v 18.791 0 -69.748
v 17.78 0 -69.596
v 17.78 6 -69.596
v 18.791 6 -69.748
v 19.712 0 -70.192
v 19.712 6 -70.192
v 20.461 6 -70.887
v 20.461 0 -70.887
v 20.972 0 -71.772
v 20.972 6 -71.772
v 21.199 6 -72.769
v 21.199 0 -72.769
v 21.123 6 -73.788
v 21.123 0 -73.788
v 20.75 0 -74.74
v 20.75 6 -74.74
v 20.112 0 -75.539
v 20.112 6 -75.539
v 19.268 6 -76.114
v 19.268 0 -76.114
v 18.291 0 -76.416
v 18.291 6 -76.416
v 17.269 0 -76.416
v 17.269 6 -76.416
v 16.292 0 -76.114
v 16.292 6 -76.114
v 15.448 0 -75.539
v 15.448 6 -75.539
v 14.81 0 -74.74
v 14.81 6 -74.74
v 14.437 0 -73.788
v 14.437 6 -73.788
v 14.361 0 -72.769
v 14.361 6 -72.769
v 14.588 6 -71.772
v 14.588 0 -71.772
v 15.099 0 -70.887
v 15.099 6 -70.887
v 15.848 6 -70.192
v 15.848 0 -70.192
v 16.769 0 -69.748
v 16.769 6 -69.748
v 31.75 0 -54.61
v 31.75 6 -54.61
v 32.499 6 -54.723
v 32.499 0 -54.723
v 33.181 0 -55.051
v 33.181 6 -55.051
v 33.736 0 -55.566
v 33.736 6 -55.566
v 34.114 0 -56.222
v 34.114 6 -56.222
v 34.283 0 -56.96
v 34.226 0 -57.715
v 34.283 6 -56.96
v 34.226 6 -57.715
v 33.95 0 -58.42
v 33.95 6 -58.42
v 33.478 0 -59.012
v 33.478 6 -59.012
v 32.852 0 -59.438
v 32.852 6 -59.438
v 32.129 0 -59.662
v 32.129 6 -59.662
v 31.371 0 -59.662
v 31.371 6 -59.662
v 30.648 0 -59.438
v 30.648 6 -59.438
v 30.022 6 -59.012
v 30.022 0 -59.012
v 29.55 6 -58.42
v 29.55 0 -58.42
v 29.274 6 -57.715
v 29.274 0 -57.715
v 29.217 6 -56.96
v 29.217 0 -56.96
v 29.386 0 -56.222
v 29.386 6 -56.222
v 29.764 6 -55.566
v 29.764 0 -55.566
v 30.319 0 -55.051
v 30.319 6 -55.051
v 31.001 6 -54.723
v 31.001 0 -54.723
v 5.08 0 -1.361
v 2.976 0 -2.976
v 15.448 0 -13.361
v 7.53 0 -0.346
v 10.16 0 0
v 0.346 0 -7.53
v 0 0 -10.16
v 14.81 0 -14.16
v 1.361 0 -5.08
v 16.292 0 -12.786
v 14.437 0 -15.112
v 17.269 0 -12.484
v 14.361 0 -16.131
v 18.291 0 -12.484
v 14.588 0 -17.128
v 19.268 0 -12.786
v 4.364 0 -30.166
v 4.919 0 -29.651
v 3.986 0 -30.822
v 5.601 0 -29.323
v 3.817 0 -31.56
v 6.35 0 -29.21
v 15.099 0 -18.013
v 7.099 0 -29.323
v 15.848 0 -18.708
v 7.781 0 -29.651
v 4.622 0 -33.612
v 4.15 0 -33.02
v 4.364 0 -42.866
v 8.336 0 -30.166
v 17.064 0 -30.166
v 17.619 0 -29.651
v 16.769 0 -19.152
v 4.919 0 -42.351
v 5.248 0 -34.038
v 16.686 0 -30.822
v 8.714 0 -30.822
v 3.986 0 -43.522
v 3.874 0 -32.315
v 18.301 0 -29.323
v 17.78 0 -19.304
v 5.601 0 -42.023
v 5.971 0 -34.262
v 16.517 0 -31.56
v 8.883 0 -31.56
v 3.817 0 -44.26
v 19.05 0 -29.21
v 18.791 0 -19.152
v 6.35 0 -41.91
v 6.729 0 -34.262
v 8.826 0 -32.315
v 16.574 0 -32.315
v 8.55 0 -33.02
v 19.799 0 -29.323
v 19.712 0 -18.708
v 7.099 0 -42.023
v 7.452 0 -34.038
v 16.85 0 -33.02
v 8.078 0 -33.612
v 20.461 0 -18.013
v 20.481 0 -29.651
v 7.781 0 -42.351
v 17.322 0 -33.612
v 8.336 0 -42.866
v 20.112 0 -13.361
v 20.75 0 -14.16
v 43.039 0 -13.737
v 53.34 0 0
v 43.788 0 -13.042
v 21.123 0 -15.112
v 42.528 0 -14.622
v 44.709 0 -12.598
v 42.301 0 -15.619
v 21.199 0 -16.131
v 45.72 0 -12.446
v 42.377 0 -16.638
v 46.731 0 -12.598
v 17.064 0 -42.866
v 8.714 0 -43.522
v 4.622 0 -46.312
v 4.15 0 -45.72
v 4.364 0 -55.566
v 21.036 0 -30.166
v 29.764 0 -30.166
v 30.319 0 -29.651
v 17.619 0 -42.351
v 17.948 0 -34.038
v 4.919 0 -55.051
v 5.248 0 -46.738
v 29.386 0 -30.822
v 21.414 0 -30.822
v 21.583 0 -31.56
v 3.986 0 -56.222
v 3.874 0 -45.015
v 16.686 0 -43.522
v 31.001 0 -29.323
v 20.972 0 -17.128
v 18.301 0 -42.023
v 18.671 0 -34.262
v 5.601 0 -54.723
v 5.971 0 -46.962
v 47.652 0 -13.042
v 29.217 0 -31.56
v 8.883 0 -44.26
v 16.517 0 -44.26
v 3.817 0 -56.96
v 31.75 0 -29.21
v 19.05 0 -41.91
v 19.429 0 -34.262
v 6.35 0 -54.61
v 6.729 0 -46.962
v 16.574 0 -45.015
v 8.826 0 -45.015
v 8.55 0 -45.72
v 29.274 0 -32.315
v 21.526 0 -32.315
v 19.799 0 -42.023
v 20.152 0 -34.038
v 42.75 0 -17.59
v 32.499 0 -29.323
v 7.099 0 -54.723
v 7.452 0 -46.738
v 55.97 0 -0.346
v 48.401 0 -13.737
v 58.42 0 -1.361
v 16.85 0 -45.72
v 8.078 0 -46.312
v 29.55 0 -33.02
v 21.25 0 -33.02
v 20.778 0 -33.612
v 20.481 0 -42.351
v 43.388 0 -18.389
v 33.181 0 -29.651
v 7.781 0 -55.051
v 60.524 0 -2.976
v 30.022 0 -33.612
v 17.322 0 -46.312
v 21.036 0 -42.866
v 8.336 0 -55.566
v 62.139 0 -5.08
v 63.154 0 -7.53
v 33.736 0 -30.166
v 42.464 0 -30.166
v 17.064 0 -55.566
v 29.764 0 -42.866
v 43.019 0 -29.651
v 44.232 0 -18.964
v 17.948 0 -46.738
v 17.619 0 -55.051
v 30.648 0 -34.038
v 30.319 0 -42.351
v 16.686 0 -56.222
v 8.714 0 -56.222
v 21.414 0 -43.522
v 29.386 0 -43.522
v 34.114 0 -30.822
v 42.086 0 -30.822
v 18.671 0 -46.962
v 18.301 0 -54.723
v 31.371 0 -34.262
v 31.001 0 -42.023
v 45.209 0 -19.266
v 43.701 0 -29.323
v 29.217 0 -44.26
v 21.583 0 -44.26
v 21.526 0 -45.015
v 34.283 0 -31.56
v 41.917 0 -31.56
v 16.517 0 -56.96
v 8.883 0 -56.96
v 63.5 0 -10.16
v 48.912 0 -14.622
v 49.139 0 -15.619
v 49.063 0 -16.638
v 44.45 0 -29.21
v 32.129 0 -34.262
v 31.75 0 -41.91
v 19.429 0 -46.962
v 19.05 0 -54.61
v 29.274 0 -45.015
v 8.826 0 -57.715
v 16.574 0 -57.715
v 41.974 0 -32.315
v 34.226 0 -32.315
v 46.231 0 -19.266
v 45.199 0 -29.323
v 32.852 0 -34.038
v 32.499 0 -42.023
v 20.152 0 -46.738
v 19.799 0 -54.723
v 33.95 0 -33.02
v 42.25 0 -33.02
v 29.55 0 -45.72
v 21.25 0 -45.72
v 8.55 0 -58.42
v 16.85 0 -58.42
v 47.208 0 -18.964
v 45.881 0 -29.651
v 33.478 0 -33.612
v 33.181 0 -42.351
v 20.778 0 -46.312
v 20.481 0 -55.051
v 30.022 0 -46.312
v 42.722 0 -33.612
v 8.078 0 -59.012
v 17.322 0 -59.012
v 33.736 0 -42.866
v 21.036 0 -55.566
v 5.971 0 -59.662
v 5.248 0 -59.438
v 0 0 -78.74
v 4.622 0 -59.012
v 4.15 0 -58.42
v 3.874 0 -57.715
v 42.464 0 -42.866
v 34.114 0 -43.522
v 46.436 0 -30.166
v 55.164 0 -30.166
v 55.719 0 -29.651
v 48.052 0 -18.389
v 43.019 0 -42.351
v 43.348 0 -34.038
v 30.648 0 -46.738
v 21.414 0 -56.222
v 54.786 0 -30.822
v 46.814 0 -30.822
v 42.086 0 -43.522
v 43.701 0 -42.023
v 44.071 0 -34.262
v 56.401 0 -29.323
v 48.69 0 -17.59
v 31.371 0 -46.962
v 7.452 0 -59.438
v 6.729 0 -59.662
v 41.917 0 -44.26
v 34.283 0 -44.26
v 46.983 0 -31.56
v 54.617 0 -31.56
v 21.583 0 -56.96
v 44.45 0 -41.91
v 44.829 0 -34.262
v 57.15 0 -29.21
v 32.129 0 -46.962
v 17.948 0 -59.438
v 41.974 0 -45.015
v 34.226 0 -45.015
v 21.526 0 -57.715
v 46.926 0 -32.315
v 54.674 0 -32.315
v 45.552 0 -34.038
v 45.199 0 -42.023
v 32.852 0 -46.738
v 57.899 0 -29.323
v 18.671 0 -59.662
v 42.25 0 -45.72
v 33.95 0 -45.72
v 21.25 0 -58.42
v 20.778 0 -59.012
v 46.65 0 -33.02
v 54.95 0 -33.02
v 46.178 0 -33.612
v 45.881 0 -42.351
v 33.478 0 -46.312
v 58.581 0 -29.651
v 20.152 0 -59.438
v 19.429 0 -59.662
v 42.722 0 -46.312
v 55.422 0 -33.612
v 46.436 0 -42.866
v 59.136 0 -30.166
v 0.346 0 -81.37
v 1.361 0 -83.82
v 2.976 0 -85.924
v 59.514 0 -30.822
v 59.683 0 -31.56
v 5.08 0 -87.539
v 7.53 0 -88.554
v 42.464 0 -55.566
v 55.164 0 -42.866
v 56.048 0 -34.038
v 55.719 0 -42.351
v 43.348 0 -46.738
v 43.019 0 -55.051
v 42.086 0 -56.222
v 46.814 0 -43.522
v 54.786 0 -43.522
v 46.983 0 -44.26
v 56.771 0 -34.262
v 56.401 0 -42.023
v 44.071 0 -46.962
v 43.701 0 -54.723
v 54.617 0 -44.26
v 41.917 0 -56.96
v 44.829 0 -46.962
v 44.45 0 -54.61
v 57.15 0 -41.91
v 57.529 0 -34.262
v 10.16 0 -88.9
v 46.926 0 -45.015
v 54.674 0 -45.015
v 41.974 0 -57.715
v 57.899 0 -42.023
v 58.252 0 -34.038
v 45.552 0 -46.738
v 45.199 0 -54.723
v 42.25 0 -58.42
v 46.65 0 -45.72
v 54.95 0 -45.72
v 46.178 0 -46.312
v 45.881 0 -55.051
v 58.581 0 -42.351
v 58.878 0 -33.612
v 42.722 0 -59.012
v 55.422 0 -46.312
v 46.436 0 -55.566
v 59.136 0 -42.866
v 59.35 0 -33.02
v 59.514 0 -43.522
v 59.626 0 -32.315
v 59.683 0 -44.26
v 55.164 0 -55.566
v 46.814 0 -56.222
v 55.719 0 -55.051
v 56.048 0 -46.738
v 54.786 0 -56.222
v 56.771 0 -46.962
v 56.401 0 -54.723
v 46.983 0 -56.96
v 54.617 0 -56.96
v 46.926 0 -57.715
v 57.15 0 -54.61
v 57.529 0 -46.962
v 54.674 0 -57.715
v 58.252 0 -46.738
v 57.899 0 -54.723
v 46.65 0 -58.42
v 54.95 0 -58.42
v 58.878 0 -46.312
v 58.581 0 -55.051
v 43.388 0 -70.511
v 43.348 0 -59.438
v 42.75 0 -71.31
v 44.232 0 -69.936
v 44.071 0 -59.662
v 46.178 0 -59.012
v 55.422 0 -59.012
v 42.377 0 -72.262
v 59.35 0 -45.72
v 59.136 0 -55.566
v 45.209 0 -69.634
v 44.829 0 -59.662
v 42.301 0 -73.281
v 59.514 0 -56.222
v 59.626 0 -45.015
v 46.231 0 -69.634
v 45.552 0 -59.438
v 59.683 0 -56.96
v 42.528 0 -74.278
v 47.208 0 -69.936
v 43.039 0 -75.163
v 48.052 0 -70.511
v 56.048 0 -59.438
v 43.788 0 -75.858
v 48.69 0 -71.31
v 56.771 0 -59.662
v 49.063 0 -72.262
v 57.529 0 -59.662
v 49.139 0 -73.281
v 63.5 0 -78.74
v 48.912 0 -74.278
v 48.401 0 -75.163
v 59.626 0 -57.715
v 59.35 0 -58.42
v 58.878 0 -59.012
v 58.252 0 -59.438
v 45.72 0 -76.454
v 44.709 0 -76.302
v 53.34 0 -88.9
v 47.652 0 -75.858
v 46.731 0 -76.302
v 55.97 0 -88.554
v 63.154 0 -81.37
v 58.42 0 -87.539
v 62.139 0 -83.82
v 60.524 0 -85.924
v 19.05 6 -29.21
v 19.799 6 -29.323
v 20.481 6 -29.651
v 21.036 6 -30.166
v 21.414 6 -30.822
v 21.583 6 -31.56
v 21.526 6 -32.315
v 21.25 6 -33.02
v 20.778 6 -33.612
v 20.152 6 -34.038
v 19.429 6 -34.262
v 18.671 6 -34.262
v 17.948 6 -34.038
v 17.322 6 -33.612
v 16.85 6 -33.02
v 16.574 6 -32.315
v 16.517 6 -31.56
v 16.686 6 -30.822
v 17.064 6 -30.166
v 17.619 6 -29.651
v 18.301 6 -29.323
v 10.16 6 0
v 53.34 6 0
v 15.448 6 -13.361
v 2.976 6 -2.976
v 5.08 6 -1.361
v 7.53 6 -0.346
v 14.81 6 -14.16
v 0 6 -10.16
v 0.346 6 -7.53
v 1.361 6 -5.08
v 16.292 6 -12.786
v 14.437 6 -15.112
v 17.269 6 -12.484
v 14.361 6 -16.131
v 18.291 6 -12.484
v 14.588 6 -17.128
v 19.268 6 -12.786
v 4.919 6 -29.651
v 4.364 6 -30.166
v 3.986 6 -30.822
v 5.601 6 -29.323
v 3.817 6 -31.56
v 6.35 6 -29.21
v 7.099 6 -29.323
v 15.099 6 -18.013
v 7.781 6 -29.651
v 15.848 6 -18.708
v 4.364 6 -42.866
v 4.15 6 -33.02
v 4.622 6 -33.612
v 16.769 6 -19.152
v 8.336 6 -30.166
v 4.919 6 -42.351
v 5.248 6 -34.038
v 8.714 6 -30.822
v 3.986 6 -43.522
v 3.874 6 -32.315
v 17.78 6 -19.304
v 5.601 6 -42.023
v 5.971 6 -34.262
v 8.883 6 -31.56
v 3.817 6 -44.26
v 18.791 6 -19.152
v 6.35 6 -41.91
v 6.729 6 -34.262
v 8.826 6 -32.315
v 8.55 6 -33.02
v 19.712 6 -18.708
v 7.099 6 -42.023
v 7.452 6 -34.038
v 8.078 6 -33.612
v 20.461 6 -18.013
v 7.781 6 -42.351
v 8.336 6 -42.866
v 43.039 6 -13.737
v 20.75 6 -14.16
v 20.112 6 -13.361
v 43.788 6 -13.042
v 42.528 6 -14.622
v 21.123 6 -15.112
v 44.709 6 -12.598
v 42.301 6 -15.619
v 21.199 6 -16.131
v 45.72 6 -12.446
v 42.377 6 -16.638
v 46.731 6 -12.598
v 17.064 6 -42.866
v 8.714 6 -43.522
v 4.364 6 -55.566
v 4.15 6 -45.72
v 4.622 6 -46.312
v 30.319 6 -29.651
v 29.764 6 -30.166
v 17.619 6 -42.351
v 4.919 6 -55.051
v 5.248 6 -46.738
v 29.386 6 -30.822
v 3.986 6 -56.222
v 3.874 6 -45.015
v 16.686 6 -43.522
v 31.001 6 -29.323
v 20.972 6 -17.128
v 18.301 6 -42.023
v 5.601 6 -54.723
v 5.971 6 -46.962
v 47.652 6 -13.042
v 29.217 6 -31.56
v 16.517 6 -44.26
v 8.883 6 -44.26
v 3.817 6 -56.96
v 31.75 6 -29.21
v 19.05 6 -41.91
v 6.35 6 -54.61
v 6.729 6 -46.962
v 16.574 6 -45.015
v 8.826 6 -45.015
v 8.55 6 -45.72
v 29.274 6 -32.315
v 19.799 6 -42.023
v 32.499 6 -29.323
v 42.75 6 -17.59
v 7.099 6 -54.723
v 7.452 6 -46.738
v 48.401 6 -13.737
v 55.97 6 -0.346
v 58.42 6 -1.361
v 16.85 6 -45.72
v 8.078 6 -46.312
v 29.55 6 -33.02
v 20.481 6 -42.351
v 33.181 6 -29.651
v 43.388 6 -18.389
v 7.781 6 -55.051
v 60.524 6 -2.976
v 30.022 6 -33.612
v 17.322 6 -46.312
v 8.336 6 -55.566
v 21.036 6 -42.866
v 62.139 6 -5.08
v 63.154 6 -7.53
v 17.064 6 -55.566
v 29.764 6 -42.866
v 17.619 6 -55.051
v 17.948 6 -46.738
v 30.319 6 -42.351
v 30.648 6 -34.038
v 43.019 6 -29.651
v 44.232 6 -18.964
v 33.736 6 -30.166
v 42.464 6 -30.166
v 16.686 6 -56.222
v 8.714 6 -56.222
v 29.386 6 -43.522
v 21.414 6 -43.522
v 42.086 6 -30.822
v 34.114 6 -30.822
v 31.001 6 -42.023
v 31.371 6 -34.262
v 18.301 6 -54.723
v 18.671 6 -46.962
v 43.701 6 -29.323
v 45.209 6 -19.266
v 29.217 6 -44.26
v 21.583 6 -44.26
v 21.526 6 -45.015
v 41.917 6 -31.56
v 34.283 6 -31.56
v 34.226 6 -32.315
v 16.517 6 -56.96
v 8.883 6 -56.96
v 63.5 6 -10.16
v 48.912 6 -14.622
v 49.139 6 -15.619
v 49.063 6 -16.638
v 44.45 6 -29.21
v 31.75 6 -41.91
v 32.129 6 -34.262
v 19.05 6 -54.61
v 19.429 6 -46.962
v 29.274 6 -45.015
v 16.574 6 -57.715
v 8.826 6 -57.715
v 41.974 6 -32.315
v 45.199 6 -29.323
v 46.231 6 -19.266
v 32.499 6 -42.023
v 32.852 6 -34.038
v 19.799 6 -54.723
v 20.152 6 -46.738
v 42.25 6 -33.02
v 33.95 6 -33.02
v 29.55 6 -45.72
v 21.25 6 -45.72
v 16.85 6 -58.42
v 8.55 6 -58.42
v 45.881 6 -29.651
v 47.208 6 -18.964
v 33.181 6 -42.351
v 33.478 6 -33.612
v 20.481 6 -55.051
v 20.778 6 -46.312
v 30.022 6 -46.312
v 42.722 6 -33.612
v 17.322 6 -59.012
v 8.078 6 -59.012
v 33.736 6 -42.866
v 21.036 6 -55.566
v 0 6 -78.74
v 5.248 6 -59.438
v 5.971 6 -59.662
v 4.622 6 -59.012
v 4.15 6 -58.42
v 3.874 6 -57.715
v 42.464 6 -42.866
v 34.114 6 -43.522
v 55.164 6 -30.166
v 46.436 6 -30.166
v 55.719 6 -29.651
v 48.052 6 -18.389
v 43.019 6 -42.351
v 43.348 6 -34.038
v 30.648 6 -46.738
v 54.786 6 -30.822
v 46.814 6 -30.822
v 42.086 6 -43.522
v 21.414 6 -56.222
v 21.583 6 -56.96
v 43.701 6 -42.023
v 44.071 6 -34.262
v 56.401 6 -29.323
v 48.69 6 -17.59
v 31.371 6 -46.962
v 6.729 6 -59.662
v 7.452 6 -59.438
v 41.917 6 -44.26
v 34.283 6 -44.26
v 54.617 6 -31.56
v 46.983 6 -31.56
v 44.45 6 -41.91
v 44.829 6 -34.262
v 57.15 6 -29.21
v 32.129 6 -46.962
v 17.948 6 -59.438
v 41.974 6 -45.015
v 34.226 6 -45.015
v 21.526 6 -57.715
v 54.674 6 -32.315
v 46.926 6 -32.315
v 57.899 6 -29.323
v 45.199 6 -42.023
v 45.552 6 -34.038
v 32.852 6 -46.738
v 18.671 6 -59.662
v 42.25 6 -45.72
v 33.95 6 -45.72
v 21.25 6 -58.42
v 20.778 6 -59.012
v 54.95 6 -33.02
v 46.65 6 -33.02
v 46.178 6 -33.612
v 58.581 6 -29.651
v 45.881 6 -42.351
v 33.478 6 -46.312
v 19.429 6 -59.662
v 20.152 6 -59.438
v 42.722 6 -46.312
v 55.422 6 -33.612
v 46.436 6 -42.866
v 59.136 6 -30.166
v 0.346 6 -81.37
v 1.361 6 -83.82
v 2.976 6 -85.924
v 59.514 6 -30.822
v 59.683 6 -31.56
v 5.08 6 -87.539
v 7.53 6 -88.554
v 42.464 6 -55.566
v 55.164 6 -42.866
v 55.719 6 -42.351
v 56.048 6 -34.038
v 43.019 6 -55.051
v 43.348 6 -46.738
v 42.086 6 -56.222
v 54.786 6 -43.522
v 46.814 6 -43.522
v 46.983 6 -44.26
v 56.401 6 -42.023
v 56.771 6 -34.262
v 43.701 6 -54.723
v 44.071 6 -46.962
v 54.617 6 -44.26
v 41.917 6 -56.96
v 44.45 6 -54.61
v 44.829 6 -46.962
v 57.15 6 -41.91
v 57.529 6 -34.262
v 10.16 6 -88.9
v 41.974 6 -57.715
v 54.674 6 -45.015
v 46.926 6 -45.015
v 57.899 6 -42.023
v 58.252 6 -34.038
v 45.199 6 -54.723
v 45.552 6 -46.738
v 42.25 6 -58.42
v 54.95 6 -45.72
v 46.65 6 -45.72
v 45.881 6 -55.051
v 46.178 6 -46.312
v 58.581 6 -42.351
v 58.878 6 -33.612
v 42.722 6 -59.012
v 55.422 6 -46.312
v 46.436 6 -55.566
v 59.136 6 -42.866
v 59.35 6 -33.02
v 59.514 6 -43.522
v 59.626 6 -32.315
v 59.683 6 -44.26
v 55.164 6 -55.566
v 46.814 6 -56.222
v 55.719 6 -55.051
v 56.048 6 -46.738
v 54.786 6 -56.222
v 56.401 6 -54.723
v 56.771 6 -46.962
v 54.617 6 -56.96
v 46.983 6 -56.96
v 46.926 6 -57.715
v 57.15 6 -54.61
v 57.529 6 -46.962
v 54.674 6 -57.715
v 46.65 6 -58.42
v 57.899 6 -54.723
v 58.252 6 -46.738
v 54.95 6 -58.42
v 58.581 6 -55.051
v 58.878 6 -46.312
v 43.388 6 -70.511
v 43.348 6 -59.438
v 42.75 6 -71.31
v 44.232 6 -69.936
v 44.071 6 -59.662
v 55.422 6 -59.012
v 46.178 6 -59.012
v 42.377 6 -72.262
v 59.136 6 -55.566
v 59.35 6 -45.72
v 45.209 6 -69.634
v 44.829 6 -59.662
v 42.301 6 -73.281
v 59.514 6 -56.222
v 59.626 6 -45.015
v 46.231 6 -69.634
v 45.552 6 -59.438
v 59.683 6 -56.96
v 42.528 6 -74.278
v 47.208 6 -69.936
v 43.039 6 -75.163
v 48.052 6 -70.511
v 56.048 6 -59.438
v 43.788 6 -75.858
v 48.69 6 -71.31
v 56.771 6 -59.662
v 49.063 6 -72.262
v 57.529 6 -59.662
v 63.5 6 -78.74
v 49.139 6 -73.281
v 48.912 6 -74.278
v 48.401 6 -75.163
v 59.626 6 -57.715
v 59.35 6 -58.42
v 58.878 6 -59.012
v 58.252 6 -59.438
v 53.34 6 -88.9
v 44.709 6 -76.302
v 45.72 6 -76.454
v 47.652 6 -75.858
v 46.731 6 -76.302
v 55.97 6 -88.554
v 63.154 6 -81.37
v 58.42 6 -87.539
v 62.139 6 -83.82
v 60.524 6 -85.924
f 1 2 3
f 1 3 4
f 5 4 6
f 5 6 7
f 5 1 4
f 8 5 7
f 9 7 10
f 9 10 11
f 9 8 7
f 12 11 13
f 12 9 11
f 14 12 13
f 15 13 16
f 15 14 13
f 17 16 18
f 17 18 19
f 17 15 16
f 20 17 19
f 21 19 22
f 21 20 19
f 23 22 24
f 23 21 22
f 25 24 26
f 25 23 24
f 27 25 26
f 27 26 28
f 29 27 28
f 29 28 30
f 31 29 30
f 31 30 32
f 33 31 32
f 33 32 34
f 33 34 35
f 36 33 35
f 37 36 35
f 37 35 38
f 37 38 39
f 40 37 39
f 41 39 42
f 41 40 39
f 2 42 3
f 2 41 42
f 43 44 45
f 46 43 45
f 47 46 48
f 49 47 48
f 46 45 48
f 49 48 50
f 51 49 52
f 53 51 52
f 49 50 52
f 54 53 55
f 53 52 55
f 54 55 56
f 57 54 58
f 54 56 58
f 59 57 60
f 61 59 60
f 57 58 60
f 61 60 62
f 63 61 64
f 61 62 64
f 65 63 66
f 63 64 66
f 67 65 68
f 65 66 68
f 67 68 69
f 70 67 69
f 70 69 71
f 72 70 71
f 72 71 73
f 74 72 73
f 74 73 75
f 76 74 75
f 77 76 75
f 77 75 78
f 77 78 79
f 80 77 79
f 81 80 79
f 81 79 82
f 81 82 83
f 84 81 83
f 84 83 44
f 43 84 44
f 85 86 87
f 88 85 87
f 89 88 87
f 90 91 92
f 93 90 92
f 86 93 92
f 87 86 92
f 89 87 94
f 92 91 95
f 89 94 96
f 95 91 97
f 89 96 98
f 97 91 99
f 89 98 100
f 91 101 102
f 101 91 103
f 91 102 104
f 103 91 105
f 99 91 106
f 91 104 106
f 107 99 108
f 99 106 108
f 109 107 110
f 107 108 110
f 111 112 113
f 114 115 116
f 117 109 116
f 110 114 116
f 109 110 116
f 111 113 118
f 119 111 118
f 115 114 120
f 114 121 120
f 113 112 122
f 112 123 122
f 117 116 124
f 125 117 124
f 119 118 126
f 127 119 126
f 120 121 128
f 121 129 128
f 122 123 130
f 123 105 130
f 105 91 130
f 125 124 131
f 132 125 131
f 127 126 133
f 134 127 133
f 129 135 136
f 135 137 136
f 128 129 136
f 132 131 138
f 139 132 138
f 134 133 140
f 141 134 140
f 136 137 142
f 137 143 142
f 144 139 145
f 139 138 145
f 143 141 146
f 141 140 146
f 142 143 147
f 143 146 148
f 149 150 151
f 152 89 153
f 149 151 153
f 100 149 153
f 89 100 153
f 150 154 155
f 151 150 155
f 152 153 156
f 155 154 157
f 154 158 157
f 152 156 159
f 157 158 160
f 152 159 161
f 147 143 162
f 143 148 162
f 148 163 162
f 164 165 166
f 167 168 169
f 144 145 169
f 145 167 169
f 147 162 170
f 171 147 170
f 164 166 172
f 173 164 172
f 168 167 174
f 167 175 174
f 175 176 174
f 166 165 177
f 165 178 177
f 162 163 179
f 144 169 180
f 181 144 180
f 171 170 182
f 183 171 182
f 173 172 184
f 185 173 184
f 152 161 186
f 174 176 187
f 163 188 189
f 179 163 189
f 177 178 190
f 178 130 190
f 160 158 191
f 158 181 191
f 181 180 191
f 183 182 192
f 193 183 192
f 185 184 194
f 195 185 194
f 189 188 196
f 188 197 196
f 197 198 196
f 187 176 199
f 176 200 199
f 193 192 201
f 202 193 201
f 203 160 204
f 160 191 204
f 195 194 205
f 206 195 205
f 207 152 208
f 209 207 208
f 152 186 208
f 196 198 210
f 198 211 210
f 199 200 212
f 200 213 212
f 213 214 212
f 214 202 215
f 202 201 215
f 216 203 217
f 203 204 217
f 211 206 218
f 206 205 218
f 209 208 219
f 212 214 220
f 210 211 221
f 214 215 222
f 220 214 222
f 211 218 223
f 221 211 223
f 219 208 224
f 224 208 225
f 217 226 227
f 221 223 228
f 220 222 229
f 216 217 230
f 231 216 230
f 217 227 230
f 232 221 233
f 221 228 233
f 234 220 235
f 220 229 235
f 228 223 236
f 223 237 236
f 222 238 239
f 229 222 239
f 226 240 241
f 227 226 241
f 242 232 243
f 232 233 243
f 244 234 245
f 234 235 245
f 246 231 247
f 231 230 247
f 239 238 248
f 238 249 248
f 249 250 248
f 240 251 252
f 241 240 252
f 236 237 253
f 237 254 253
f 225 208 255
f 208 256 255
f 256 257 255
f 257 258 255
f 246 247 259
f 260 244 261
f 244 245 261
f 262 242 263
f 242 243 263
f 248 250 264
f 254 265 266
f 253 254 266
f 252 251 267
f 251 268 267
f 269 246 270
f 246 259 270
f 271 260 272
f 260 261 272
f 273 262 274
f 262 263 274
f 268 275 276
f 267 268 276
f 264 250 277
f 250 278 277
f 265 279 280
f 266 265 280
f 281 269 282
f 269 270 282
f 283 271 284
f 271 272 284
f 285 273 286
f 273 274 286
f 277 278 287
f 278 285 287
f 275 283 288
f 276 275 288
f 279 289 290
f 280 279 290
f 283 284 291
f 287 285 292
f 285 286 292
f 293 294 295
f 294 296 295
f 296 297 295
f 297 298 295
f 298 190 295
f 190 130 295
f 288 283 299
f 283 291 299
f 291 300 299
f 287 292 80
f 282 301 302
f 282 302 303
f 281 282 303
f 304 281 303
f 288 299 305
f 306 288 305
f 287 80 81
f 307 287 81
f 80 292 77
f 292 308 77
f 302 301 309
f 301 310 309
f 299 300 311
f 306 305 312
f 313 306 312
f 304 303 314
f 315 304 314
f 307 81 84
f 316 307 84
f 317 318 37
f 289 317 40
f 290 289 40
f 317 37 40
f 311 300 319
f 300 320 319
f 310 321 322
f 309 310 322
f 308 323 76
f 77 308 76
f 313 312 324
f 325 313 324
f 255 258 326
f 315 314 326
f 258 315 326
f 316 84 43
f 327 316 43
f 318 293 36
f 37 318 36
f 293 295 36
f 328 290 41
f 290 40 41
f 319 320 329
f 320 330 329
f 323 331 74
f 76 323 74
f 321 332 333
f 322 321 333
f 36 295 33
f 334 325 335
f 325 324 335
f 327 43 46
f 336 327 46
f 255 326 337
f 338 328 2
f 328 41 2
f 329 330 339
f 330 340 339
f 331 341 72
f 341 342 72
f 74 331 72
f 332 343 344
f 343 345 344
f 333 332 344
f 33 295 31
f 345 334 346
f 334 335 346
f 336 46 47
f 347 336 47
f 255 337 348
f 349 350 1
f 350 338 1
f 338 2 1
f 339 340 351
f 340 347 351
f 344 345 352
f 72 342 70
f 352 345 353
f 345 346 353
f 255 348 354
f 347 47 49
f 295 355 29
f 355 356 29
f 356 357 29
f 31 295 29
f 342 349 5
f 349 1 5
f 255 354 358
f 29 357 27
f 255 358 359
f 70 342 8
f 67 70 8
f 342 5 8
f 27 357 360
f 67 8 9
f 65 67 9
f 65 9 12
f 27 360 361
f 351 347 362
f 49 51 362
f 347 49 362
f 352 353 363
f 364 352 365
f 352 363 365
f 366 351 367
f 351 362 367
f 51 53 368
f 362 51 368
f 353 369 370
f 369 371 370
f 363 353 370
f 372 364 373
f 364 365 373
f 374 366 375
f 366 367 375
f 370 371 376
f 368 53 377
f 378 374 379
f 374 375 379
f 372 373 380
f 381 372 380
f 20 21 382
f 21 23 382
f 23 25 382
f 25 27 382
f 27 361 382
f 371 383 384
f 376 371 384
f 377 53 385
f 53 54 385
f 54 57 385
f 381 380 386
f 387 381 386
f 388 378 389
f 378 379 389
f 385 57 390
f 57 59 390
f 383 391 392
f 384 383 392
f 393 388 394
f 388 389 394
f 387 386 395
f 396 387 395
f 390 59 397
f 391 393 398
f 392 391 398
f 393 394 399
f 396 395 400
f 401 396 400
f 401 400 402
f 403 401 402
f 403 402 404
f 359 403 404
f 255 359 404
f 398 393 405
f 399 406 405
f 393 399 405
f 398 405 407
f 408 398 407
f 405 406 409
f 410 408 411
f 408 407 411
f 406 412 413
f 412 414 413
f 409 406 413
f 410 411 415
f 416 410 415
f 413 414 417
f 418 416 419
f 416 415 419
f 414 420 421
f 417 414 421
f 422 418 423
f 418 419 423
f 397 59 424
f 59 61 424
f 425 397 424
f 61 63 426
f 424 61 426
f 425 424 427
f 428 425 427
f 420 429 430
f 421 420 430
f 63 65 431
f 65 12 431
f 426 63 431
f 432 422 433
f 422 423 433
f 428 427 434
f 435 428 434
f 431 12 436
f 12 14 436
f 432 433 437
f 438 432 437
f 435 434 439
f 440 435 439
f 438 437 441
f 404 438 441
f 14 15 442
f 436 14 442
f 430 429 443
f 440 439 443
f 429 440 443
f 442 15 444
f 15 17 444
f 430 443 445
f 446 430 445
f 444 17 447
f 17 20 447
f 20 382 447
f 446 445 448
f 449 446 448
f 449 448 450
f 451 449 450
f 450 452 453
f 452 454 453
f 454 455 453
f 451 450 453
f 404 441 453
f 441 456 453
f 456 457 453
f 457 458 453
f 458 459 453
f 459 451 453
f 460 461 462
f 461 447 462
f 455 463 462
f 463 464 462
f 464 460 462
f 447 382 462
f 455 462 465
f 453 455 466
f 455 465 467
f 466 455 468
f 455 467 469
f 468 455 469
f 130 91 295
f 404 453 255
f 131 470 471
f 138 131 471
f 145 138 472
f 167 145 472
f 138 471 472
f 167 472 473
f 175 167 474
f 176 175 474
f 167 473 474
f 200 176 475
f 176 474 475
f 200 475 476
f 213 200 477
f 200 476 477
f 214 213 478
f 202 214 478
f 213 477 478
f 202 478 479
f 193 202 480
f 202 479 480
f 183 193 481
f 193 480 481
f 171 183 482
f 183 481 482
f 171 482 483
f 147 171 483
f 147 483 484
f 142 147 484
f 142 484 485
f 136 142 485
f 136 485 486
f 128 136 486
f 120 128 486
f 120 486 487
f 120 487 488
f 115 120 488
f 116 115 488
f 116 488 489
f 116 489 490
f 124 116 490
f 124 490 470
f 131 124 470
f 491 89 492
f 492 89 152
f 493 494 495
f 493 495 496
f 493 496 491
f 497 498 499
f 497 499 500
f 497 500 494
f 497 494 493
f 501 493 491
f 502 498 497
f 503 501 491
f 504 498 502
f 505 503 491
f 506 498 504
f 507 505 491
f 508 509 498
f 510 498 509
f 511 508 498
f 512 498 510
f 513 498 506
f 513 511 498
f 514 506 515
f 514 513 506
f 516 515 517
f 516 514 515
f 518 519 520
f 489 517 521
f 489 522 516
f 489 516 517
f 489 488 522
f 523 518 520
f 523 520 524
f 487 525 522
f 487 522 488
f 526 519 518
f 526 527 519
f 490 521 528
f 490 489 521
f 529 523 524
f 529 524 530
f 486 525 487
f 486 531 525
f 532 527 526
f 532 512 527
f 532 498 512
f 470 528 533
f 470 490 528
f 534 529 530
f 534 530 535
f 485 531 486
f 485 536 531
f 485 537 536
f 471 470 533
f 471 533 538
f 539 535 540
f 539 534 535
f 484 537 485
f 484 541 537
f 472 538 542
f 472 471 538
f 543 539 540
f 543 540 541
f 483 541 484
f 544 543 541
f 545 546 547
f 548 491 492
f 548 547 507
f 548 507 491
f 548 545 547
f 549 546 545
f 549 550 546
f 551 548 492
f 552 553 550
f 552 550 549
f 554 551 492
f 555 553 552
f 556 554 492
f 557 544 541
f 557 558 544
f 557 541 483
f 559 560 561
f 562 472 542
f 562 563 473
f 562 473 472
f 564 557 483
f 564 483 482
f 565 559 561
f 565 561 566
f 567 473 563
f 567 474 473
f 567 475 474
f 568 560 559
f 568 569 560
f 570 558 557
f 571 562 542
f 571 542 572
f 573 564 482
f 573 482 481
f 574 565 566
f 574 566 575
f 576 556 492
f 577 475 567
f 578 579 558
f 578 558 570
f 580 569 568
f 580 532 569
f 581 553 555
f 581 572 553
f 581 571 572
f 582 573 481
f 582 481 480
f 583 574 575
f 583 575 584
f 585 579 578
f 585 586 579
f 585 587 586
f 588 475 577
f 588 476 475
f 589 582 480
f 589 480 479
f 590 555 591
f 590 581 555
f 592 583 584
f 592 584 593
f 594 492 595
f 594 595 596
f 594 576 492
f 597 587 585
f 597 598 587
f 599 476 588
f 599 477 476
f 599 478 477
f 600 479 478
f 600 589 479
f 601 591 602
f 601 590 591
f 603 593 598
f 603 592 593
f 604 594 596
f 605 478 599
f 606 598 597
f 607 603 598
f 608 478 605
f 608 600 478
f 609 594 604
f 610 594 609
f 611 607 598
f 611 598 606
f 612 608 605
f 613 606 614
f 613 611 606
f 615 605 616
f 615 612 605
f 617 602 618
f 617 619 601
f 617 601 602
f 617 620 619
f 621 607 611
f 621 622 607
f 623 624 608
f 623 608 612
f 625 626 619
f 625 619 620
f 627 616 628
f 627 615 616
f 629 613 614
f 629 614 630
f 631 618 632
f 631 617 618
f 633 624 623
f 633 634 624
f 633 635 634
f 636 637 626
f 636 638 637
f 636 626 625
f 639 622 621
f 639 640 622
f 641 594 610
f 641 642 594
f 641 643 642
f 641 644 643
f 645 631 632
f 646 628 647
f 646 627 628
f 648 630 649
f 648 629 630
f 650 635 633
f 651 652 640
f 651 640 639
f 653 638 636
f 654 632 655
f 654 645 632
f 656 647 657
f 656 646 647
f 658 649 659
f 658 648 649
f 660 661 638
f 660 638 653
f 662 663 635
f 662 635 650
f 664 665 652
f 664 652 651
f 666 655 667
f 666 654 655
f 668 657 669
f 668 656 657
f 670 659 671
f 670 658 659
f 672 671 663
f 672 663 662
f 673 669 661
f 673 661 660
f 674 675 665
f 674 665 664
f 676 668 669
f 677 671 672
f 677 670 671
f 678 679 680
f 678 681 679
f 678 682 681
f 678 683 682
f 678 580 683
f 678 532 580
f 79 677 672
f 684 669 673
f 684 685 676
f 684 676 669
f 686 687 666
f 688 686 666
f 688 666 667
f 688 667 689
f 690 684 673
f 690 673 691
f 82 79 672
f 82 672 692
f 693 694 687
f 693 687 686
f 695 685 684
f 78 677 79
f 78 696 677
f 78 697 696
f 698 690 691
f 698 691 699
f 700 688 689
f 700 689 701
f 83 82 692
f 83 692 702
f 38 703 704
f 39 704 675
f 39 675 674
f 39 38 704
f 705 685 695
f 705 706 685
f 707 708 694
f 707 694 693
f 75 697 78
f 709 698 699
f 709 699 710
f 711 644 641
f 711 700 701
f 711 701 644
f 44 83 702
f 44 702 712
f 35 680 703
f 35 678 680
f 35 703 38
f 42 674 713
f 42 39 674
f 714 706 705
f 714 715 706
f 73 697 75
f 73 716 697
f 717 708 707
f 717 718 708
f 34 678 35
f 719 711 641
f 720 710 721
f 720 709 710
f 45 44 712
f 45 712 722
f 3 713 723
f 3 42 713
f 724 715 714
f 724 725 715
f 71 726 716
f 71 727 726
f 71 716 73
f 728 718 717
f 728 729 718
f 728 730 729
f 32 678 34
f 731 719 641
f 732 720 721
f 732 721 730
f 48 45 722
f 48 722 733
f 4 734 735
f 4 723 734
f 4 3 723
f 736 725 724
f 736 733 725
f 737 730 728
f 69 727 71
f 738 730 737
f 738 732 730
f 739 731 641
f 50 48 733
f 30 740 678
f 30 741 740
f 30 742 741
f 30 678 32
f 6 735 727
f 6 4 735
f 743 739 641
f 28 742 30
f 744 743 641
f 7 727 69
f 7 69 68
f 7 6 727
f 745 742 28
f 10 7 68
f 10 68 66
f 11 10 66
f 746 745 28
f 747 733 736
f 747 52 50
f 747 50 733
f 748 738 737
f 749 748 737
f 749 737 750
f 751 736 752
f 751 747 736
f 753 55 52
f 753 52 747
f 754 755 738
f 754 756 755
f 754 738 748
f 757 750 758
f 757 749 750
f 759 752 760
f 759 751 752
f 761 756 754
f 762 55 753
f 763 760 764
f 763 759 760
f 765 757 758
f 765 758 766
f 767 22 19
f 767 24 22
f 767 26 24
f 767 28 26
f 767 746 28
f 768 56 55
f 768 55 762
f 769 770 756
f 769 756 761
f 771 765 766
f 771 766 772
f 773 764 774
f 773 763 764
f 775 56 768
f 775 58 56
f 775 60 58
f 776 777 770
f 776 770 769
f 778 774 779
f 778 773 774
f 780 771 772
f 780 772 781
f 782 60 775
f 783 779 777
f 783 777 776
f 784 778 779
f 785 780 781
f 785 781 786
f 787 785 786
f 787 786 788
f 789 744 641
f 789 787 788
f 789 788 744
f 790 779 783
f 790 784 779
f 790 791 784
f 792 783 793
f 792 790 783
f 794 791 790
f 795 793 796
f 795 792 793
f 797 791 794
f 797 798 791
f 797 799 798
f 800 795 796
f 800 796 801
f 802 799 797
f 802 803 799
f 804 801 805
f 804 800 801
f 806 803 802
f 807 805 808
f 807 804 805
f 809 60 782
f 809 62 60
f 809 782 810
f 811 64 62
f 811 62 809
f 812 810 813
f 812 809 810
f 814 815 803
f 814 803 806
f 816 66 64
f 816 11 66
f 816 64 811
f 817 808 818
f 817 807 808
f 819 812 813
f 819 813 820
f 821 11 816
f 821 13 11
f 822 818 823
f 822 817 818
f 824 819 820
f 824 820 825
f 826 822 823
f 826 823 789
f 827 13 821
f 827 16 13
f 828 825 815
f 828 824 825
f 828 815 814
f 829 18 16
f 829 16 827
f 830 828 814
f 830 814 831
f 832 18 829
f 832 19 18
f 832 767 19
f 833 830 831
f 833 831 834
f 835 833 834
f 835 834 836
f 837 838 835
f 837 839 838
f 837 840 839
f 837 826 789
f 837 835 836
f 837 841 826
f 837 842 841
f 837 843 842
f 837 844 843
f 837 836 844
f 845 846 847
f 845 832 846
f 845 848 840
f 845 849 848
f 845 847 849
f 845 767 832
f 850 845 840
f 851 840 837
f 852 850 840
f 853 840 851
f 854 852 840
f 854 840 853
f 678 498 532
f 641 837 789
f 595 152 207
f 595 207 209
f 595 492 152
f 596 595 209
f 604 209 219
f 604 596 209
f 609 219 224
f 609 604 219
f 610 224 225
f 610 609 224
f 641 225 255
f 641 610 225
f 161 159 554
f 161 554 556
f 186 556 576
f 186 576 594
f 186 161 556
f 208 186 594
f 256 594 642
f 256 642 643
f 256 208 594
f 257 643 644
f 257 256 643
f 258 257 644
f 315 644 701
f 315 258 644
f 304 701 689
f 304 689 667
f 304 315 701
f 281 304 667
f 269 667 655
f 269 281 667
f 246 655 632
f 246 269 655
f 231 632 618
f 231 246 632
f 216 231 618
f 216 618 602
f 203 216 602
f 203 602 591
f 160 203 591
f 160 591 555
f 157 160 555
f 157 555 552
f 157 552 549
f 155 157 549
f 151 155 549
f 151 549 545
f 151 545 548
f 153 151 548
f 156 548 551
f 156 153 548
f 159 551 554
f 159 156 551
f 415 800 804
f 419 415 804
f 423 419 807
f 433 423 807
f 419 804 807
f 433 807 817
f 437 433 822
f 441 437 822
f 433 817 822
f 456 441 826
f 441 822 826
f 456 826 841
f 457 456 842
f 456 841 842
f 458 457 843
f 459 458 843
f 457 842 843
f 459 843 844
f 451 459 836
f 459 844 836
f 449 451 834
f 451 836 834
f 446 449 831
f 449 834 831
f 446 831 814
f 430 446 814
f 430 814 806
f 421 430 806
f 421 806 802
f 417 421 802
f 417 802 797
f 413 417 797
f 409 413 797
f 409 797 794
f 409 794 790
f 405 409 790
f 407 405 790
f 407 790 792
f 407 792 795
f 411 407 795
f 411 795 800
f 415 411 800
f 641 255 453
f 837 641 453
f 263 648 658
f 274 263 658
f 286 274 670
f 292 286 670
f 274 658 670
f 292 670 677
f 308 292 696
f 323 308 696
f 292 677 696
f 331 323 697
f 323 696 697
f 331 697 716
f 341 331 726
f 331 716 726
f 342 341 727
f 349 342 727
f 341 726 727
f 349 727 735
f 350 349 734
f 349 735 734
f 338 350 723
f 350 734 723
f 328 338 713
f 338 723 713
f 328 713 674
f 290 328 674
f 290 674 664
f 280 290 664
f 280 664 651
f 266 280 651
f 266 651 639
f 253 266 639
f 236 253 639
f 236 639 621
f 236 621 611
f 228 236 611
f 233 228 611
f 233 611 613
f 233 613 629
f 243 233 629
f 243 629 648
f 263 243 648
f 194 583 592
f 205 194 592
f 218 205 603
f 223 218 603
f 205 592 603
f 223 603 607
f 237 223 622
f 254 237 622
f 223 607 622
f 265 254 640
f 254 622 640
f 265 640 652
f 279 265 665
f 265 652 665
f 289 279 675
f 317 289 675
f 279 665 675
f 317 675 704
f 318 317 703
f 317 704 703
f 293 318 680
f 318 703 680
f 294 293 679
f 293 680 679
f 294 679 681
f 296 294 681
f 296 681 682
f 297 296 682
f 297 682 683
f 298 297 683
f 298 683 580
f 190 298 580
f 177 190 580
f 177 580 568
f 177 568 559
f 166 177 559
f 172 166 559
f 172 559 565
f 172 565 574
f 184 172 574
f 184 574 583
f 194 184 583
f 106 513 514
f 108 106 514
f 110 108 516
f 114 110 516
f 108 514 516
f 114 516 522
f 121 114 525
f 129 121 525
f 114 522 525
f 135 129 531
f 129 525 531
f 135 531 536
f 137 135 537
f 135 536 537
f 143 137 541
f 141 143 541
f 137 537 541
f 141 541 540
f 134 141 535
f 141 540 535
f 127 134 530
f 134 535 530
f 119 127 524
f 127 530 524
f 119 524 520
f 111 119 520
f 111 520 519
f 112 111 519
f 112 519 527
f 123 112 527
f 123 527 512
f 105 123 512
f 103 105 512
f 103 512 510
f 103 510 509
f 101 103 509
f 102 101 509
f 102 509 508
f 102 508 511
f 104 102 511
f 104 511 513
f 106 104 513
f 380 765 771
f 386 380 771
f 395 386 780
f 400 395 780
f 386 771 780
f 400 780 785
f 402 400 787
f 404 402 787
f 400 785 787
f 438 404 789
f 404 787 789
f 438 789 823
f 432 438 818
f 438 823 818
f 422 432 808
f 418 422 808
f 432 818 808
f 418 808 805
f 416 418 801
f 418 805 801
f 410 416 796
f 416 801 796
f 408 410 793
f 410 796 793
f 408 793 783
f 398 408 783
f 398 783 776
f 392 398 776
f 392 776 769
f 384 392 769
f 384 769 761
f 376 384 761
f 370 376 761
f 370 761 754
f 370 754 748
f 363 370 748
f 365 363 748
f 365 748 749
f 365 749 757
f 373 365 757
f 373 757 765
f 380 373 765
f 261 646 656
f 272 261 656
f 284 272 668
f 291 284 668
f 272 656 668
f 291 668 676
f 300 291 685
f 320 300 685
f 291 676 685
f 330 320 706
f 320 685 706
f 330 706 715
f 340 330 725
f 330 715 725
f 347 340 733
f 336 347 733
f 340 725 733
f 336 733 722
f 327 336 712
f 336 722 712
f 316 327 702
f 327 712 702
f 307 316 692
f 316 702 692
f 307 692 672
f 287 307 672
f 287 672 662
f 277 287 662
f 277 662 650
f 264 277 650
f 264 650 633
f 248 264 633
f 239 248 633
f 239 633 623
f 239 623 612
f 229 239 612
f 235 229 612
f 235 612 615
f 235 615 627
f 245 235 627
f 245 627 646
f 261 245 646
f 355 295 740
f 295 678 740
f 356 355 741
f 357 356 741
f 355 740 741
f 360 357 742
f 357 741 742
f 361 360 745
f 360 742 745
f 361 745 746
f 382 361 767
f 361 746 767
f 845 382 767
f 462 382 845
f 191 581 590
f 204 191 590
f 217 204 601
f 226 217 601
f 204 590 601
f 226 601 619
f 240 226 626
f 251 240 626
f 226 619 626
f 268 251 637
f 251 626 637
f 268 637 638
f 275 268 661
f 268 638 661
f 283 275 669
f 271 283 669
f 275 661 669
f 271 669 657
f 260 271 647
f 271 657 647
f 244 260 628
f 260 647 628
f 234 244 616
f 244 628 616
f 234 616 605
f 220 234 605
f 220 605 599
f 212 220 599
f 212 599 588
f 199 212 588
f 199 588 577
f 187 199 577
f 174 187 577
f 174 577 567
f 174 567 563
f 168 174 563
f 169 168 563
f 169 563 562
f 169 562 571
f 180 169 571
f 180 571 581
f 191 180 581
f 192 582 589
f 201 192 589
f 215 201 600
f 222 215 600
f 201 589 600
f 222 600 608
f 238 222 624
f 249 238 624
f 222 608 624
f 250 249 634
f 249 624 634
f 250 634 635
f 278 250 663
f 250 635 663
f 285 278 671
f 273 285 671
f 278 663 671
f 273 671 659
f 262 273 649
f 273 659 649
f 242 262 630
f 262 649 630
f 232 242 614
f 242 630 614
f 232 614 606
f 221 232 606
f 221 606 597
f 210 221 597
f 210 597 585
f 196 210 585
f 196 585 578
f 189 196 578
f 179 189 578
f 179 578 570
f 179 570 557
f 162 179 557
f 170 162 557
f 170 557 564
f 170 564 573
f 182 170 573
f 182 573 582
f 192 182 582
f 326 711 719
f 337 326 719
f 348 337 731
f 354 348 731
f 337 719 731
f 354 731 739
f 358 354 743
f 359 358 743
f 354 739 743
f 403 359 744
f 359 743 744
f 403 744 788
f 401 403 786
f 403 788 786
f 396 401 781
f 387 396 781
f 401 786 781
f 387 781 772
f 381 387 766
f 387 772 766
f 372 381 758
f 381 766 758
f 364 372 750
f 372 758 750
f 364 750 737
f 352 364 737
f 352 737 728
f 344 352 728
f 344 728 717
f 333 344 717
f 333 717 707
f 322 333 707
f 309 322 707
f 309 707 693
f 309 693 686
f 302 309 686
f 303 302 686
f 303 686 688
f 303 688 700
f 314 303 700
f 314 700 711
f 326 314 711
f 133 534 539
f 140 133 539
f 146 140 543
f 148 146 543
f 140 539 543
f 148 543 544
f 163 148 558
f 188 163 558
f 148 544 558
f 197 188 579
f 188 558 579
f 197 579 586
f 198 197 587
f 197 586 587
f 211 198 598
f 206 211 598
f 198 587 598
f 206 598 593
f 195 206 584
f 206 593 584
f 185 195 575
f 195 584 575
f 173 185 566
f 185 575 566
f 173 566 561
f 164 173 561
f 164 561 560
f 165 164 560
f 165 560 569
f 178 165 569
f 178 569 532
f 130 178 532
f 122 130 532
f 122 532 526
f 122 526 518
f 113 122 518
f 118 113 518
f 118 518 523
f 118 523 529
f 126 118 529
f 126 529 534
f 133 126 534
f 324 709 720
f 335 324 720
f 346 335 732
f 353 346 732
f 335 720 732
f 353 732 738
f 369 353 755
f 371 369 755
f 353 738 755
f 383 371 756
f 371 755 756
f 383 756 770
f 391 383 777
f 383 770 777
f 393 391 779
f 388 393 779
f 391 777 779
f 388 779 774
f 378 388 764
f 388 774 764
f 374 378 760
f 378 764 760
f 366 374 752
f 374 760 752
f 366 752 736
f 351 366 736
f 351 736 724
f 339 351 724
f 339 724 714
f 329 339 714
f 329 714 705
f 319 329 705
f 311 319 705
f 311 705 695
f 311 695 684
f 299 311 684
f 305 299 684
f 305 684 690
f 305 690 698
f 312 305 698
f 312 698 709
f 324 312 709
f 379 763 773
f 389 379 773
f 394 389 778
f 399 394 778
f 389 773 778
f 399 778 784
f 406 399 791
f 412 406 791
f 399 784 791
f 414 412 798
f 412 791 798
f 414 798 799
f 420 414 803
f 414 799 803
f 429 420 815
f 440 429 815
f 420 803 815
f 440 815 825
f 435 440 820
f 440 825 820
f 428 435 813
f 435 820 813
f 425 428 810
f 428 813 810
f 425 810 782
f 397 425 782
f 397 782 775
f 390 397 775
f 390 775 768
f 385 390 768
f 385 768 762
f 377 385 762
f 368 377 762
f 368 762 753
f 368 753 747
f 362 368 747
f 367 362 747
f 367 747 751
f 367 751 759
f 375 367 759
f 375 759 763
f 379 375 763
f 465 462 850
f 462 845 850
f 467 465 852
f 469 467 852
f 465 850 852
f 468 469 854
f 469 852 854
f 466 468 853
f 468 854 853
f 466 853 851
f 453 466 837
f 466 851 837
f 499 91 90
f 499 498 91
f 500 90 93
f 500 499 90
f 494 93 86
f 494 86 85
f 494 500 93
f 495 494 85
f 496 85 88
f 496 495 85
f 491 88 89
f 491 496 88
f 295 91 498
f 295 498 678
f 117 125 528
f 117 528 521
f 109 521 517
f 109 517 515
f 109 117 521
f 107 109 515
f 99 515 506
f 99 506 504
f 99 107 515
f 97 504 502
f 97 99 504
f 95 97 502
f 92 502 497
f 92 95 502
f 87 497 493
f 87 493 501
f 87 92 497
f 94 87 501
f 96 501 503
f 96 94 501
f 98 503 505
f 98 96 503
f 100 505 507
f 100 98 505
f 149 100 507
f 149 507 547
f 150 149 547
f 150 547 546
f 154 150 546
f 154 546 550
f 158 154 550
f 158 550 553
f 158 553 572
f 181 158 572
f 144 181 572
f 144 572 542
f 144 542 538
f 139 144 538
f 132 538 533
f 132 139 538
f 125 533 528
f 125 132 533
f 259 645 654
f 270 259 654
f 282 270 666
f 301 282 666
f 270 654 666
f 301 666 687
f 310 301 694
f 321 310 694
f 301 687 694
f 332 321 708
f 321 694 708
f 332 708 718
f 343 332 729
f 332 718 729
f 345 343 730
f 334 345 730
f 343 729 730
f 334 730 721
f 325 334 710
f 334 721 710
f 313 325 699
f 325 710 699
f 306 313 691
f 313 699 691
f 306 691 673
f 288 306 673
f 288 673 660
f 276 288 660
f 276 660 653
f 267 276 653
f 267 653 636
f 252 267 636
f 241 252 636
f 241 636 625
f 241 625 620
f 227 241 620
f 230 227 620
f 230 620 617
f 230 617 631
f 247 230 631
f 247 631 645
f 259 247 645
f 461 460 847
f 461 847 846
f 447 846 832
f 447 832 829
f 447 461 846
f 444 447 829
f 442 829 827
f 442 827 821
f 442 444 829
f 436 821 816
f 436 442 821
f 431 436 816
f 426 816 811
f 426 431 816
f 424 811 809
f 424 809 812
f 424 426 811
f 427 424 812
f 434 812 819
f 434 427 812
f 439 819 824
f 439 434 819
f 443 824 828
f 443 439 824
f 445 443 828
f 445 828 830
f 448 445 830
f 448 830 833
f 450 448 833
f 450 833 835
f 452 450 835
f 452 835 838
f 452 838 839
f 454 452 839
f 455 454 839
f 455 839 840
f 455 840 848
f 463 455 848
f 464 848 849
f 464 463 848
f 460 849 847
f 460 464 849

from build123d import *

# Parameters (mm, degrees)
SKETCH1_W           = 63.5
SKETCH1_H           = 88.9
SKETCH1_R           = 3.429
BOSS_EXTRUDE1_DEPTH = 6
FILLET1_R           = 10.16
SKETCH2_R           = 2.54
CUT_EXTRUDE1_DEPTH  = 110.414167273


with BuildPart() as part:
    # Sketch1 → Boss-Extrude1 (new body)
    with BuildSketch(Plane(origin=(0, 0, 0), x_dir=(1, 0, 0), z_dir=(0, 1, 0))):
        with Locations((31.75, 44.45)):
            Rectangle(SKETCH1_W, SKETCH1_H)
        with Locations(Location((17.78, 73.025, 0), (0, 0, 270))):
            Circle(SKETCH1_R, mode=Mode.SUBTRACT)
        with Locations(Location((45.72, 15.875, 0), (0, 0, 270))):
            Circle(SKETCH1_R, mode=Mode.SUBTRACT)
        with Locations(Location((17.78, 15.875, 0), (0, 0, 90))):
            Circle(SKETCH1_R, mode=Mode.SUBTRACT)
        with Locations(Location((45.72, 73.025, 0), (0, 0, 90))):
            Circle(SKETCH1_R, mode=Mode.SUBTRACT)
    extrude(amount=BOSS_EXTRUDE1_DEPTH)

    # Fillet1
    fillet1_edges = [part.edges().sort_by_distance(p)[0] for p in [
        (0, 3, -88.9),
        (63.5, 3, -88.9),
        (63.5, 3, 0),
        (0, 3, 0),
    ]]
    fillet(fillet1_edges, radius=FILLET1_R)

    # Sketch2 → Cut-Extrude1 (cut, through all)
    with BuildSketch(Plane(origin=(0, 6, 0), x_dir=(1, 0, 0), z_dir=(0, 1, 0))):
        with Locations(Location((6.35, 31.75, 0), (0, 0, 270))):
            Circle(SKETCH2_R)
        with Locations(Location((6.35, 44.45, 0), (0, 0, 270))):
            Circle(SKETCH2_R)
        with Locations(Location((6.35, 57.15, 0), (0, 0, 270))):
            Circle(SKETCH2_R)
        with Locations(Location((19.05, 57.15, 0), (0, 0, 270))):
            Circle(SKETCH2_R)
        with Locations(Location((19.05, 44.45, 0), (0, 0, 270))):
            Circle(SKETCH2_R)
        with Locations(Location((19.05, 31.75, 0), (0, 0, 270))):
            Circle(SKETCH2_R)
        with Locations(Location((31.75, 31.75, 0), (0, 0, 270))):
            Circle(SKETCH2_R)
        with Locations(Location((31.75, 44.45, 0), (0, 0, 270))):
            Circle(SKETCH2_R)
        with Locations(Location((31.75, 57.15, 0), (0, 0, 270))):
            Circle(SKETCH2_R)
        with Locations(Location((44.45, 57.15, 0), (0, 0, 270))):
            Circle(SKETCH2_R)
        with Locations(Location((44.45, 44.45, 0), (0, 0, 270))):
            Circle(SKETCH2_R)
        with Locations(Location((57.15, 44.45, 0), (0, 0, 270))):
            Circle(SKETCH2_R)
        with Locations(Location((57.15, 31.75, 0), (0, 0, 270))):
            Circle(SKETCH2_R)
        with Locations(Location((44.45, 31.75, 0), (0, 0, 270))):
            Circle(SKETCH2_R)
        with Locations(Location((57.15, 57.15, 0), (0, 0, 270))):
            Circle(SKETCH2_R)
    extrude(amount=-CUT_EXTRUDE1_DEPTH, mode=Mode.SUBTRACT)


solid = part.part
